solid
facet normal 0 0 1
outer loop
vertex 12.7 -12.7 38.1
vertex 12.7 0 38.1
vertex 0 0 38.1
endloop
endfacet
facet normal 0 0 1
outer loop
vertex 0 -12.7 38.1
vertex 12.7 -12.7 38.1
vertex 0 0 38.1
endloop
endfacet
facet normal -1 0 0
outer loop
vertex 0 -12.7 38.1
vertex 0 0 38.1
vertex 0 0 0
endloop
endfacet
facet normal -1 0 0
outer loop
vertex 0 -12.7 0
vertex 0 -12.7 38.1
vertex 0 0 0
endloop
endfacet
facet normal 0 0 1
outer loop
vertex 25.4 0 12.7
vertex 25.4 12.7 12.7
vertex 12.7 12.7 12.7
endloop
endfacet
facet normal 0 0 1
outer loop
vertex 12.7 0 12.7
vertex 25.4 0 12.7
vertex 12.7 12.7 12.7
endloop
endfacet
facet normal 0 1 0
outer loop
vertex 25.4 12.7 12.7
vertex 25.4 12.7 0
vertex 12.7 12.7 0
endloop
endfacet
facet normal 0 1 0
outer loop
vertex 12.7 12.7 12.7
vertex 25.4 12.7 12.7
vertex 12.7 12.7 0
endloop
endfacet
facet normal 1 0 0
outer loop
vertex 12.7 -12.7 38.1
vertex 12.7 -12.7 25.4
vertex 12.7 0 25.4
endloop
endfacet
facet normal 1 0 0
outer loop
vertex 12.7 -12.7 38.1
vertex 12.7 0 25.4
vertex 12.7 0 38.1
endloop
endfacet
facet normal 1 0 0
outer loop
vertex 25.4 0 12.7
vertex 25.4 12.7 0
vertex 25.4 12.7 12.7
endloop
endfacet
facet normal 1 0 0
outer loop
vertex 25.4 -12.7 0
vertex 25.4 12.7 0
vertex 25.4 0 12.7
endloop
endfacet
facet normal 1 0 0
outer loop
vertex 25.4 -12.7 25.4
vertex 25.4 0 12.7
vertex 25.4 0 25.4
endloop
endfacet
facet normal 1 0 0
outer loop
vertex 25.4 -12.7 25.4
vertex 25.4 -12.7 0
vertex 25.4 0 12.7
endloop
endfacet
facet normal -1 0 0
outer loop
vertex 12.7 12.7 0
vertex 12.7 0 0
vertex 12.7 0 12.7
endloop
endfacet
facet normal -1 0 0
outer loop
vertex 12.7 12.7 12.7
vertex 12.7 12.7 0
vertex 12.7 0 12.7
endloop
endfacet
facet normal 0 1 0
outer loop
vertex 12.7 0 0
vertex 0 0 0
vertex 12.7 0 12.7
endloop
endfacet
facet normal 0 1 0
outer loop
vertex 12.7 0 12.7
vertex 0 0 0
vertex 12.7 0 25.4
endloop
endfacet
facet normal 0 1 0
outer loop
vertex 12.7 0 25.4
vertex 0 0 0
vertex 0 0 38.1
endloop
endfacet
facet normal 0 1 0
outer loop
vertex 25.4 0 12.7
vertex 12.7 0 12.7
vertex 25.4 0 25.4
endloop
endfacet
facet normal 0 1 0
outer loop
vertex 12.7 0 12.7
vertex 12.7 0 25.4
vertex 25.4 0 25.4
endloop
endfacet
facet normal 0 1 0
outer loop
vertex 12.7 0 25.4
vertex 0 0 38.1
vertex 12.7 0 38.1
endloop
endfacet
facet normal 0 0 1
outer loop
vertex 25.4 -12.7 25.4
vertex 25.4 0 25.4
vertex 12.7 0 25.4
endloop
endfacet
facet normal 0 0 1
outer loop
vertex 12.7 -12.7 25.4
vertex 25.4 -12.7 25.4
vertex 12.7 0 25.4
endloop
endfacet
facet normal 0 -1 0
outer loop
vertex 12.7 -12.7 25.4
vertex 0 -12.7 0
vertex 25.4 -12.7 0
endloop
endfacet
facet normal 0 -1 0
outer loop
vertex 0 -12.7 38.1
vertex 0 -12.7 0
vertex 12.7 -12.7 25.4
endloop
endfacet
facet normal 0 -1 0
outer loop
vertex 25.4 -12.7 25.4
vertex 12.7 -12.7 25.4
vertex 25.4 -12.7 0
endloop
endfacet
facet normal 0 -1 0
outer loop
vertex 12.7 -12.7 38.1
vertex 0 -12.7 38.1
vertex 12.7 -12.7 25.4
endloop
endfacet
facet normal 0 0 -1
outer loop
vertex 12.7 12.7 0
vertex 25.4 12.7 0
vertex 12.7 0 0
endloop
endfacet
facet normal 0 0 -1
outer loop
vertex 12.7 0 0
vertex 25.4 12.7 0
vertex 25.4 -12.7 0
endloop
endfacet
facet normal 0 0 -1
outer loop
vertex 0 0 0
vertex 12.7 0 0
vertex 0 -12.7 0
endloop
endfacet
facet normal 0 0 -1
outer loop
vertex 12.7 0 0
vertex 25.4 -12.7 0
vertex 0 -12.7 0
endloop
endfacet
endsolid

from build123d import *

# Parameters (mm, degrees)
F1_DEPTH = 12.7
F2_W     = 12.7
F2_H     = 12.7
F3_DEPTH = 12.7


with BuildPart() as f1:
    # F0 (on Front) → F1 (new body)
    with BuildSketch(Plane.XZ):
        Polygon((0, 38.1), (0, 0), (25.4, 0), (25.4, 25.4), (12.7, 25.4), (12.7, 38.1), align=None)
    extrude(amount=F1_DEPTH)

    # F2 (on face) → F3 (join)
    with BuildSketch(Plane(origin=(0, 0, 0), x_dir=(-1, 0, 0), z_dir=(0, 1, 0))):
        with Locations((-19.05, 6.35)):
            Rectangle(F2_W, F2_H)
    extrude(amount=F3_DEPTH)


solid = f1.part
